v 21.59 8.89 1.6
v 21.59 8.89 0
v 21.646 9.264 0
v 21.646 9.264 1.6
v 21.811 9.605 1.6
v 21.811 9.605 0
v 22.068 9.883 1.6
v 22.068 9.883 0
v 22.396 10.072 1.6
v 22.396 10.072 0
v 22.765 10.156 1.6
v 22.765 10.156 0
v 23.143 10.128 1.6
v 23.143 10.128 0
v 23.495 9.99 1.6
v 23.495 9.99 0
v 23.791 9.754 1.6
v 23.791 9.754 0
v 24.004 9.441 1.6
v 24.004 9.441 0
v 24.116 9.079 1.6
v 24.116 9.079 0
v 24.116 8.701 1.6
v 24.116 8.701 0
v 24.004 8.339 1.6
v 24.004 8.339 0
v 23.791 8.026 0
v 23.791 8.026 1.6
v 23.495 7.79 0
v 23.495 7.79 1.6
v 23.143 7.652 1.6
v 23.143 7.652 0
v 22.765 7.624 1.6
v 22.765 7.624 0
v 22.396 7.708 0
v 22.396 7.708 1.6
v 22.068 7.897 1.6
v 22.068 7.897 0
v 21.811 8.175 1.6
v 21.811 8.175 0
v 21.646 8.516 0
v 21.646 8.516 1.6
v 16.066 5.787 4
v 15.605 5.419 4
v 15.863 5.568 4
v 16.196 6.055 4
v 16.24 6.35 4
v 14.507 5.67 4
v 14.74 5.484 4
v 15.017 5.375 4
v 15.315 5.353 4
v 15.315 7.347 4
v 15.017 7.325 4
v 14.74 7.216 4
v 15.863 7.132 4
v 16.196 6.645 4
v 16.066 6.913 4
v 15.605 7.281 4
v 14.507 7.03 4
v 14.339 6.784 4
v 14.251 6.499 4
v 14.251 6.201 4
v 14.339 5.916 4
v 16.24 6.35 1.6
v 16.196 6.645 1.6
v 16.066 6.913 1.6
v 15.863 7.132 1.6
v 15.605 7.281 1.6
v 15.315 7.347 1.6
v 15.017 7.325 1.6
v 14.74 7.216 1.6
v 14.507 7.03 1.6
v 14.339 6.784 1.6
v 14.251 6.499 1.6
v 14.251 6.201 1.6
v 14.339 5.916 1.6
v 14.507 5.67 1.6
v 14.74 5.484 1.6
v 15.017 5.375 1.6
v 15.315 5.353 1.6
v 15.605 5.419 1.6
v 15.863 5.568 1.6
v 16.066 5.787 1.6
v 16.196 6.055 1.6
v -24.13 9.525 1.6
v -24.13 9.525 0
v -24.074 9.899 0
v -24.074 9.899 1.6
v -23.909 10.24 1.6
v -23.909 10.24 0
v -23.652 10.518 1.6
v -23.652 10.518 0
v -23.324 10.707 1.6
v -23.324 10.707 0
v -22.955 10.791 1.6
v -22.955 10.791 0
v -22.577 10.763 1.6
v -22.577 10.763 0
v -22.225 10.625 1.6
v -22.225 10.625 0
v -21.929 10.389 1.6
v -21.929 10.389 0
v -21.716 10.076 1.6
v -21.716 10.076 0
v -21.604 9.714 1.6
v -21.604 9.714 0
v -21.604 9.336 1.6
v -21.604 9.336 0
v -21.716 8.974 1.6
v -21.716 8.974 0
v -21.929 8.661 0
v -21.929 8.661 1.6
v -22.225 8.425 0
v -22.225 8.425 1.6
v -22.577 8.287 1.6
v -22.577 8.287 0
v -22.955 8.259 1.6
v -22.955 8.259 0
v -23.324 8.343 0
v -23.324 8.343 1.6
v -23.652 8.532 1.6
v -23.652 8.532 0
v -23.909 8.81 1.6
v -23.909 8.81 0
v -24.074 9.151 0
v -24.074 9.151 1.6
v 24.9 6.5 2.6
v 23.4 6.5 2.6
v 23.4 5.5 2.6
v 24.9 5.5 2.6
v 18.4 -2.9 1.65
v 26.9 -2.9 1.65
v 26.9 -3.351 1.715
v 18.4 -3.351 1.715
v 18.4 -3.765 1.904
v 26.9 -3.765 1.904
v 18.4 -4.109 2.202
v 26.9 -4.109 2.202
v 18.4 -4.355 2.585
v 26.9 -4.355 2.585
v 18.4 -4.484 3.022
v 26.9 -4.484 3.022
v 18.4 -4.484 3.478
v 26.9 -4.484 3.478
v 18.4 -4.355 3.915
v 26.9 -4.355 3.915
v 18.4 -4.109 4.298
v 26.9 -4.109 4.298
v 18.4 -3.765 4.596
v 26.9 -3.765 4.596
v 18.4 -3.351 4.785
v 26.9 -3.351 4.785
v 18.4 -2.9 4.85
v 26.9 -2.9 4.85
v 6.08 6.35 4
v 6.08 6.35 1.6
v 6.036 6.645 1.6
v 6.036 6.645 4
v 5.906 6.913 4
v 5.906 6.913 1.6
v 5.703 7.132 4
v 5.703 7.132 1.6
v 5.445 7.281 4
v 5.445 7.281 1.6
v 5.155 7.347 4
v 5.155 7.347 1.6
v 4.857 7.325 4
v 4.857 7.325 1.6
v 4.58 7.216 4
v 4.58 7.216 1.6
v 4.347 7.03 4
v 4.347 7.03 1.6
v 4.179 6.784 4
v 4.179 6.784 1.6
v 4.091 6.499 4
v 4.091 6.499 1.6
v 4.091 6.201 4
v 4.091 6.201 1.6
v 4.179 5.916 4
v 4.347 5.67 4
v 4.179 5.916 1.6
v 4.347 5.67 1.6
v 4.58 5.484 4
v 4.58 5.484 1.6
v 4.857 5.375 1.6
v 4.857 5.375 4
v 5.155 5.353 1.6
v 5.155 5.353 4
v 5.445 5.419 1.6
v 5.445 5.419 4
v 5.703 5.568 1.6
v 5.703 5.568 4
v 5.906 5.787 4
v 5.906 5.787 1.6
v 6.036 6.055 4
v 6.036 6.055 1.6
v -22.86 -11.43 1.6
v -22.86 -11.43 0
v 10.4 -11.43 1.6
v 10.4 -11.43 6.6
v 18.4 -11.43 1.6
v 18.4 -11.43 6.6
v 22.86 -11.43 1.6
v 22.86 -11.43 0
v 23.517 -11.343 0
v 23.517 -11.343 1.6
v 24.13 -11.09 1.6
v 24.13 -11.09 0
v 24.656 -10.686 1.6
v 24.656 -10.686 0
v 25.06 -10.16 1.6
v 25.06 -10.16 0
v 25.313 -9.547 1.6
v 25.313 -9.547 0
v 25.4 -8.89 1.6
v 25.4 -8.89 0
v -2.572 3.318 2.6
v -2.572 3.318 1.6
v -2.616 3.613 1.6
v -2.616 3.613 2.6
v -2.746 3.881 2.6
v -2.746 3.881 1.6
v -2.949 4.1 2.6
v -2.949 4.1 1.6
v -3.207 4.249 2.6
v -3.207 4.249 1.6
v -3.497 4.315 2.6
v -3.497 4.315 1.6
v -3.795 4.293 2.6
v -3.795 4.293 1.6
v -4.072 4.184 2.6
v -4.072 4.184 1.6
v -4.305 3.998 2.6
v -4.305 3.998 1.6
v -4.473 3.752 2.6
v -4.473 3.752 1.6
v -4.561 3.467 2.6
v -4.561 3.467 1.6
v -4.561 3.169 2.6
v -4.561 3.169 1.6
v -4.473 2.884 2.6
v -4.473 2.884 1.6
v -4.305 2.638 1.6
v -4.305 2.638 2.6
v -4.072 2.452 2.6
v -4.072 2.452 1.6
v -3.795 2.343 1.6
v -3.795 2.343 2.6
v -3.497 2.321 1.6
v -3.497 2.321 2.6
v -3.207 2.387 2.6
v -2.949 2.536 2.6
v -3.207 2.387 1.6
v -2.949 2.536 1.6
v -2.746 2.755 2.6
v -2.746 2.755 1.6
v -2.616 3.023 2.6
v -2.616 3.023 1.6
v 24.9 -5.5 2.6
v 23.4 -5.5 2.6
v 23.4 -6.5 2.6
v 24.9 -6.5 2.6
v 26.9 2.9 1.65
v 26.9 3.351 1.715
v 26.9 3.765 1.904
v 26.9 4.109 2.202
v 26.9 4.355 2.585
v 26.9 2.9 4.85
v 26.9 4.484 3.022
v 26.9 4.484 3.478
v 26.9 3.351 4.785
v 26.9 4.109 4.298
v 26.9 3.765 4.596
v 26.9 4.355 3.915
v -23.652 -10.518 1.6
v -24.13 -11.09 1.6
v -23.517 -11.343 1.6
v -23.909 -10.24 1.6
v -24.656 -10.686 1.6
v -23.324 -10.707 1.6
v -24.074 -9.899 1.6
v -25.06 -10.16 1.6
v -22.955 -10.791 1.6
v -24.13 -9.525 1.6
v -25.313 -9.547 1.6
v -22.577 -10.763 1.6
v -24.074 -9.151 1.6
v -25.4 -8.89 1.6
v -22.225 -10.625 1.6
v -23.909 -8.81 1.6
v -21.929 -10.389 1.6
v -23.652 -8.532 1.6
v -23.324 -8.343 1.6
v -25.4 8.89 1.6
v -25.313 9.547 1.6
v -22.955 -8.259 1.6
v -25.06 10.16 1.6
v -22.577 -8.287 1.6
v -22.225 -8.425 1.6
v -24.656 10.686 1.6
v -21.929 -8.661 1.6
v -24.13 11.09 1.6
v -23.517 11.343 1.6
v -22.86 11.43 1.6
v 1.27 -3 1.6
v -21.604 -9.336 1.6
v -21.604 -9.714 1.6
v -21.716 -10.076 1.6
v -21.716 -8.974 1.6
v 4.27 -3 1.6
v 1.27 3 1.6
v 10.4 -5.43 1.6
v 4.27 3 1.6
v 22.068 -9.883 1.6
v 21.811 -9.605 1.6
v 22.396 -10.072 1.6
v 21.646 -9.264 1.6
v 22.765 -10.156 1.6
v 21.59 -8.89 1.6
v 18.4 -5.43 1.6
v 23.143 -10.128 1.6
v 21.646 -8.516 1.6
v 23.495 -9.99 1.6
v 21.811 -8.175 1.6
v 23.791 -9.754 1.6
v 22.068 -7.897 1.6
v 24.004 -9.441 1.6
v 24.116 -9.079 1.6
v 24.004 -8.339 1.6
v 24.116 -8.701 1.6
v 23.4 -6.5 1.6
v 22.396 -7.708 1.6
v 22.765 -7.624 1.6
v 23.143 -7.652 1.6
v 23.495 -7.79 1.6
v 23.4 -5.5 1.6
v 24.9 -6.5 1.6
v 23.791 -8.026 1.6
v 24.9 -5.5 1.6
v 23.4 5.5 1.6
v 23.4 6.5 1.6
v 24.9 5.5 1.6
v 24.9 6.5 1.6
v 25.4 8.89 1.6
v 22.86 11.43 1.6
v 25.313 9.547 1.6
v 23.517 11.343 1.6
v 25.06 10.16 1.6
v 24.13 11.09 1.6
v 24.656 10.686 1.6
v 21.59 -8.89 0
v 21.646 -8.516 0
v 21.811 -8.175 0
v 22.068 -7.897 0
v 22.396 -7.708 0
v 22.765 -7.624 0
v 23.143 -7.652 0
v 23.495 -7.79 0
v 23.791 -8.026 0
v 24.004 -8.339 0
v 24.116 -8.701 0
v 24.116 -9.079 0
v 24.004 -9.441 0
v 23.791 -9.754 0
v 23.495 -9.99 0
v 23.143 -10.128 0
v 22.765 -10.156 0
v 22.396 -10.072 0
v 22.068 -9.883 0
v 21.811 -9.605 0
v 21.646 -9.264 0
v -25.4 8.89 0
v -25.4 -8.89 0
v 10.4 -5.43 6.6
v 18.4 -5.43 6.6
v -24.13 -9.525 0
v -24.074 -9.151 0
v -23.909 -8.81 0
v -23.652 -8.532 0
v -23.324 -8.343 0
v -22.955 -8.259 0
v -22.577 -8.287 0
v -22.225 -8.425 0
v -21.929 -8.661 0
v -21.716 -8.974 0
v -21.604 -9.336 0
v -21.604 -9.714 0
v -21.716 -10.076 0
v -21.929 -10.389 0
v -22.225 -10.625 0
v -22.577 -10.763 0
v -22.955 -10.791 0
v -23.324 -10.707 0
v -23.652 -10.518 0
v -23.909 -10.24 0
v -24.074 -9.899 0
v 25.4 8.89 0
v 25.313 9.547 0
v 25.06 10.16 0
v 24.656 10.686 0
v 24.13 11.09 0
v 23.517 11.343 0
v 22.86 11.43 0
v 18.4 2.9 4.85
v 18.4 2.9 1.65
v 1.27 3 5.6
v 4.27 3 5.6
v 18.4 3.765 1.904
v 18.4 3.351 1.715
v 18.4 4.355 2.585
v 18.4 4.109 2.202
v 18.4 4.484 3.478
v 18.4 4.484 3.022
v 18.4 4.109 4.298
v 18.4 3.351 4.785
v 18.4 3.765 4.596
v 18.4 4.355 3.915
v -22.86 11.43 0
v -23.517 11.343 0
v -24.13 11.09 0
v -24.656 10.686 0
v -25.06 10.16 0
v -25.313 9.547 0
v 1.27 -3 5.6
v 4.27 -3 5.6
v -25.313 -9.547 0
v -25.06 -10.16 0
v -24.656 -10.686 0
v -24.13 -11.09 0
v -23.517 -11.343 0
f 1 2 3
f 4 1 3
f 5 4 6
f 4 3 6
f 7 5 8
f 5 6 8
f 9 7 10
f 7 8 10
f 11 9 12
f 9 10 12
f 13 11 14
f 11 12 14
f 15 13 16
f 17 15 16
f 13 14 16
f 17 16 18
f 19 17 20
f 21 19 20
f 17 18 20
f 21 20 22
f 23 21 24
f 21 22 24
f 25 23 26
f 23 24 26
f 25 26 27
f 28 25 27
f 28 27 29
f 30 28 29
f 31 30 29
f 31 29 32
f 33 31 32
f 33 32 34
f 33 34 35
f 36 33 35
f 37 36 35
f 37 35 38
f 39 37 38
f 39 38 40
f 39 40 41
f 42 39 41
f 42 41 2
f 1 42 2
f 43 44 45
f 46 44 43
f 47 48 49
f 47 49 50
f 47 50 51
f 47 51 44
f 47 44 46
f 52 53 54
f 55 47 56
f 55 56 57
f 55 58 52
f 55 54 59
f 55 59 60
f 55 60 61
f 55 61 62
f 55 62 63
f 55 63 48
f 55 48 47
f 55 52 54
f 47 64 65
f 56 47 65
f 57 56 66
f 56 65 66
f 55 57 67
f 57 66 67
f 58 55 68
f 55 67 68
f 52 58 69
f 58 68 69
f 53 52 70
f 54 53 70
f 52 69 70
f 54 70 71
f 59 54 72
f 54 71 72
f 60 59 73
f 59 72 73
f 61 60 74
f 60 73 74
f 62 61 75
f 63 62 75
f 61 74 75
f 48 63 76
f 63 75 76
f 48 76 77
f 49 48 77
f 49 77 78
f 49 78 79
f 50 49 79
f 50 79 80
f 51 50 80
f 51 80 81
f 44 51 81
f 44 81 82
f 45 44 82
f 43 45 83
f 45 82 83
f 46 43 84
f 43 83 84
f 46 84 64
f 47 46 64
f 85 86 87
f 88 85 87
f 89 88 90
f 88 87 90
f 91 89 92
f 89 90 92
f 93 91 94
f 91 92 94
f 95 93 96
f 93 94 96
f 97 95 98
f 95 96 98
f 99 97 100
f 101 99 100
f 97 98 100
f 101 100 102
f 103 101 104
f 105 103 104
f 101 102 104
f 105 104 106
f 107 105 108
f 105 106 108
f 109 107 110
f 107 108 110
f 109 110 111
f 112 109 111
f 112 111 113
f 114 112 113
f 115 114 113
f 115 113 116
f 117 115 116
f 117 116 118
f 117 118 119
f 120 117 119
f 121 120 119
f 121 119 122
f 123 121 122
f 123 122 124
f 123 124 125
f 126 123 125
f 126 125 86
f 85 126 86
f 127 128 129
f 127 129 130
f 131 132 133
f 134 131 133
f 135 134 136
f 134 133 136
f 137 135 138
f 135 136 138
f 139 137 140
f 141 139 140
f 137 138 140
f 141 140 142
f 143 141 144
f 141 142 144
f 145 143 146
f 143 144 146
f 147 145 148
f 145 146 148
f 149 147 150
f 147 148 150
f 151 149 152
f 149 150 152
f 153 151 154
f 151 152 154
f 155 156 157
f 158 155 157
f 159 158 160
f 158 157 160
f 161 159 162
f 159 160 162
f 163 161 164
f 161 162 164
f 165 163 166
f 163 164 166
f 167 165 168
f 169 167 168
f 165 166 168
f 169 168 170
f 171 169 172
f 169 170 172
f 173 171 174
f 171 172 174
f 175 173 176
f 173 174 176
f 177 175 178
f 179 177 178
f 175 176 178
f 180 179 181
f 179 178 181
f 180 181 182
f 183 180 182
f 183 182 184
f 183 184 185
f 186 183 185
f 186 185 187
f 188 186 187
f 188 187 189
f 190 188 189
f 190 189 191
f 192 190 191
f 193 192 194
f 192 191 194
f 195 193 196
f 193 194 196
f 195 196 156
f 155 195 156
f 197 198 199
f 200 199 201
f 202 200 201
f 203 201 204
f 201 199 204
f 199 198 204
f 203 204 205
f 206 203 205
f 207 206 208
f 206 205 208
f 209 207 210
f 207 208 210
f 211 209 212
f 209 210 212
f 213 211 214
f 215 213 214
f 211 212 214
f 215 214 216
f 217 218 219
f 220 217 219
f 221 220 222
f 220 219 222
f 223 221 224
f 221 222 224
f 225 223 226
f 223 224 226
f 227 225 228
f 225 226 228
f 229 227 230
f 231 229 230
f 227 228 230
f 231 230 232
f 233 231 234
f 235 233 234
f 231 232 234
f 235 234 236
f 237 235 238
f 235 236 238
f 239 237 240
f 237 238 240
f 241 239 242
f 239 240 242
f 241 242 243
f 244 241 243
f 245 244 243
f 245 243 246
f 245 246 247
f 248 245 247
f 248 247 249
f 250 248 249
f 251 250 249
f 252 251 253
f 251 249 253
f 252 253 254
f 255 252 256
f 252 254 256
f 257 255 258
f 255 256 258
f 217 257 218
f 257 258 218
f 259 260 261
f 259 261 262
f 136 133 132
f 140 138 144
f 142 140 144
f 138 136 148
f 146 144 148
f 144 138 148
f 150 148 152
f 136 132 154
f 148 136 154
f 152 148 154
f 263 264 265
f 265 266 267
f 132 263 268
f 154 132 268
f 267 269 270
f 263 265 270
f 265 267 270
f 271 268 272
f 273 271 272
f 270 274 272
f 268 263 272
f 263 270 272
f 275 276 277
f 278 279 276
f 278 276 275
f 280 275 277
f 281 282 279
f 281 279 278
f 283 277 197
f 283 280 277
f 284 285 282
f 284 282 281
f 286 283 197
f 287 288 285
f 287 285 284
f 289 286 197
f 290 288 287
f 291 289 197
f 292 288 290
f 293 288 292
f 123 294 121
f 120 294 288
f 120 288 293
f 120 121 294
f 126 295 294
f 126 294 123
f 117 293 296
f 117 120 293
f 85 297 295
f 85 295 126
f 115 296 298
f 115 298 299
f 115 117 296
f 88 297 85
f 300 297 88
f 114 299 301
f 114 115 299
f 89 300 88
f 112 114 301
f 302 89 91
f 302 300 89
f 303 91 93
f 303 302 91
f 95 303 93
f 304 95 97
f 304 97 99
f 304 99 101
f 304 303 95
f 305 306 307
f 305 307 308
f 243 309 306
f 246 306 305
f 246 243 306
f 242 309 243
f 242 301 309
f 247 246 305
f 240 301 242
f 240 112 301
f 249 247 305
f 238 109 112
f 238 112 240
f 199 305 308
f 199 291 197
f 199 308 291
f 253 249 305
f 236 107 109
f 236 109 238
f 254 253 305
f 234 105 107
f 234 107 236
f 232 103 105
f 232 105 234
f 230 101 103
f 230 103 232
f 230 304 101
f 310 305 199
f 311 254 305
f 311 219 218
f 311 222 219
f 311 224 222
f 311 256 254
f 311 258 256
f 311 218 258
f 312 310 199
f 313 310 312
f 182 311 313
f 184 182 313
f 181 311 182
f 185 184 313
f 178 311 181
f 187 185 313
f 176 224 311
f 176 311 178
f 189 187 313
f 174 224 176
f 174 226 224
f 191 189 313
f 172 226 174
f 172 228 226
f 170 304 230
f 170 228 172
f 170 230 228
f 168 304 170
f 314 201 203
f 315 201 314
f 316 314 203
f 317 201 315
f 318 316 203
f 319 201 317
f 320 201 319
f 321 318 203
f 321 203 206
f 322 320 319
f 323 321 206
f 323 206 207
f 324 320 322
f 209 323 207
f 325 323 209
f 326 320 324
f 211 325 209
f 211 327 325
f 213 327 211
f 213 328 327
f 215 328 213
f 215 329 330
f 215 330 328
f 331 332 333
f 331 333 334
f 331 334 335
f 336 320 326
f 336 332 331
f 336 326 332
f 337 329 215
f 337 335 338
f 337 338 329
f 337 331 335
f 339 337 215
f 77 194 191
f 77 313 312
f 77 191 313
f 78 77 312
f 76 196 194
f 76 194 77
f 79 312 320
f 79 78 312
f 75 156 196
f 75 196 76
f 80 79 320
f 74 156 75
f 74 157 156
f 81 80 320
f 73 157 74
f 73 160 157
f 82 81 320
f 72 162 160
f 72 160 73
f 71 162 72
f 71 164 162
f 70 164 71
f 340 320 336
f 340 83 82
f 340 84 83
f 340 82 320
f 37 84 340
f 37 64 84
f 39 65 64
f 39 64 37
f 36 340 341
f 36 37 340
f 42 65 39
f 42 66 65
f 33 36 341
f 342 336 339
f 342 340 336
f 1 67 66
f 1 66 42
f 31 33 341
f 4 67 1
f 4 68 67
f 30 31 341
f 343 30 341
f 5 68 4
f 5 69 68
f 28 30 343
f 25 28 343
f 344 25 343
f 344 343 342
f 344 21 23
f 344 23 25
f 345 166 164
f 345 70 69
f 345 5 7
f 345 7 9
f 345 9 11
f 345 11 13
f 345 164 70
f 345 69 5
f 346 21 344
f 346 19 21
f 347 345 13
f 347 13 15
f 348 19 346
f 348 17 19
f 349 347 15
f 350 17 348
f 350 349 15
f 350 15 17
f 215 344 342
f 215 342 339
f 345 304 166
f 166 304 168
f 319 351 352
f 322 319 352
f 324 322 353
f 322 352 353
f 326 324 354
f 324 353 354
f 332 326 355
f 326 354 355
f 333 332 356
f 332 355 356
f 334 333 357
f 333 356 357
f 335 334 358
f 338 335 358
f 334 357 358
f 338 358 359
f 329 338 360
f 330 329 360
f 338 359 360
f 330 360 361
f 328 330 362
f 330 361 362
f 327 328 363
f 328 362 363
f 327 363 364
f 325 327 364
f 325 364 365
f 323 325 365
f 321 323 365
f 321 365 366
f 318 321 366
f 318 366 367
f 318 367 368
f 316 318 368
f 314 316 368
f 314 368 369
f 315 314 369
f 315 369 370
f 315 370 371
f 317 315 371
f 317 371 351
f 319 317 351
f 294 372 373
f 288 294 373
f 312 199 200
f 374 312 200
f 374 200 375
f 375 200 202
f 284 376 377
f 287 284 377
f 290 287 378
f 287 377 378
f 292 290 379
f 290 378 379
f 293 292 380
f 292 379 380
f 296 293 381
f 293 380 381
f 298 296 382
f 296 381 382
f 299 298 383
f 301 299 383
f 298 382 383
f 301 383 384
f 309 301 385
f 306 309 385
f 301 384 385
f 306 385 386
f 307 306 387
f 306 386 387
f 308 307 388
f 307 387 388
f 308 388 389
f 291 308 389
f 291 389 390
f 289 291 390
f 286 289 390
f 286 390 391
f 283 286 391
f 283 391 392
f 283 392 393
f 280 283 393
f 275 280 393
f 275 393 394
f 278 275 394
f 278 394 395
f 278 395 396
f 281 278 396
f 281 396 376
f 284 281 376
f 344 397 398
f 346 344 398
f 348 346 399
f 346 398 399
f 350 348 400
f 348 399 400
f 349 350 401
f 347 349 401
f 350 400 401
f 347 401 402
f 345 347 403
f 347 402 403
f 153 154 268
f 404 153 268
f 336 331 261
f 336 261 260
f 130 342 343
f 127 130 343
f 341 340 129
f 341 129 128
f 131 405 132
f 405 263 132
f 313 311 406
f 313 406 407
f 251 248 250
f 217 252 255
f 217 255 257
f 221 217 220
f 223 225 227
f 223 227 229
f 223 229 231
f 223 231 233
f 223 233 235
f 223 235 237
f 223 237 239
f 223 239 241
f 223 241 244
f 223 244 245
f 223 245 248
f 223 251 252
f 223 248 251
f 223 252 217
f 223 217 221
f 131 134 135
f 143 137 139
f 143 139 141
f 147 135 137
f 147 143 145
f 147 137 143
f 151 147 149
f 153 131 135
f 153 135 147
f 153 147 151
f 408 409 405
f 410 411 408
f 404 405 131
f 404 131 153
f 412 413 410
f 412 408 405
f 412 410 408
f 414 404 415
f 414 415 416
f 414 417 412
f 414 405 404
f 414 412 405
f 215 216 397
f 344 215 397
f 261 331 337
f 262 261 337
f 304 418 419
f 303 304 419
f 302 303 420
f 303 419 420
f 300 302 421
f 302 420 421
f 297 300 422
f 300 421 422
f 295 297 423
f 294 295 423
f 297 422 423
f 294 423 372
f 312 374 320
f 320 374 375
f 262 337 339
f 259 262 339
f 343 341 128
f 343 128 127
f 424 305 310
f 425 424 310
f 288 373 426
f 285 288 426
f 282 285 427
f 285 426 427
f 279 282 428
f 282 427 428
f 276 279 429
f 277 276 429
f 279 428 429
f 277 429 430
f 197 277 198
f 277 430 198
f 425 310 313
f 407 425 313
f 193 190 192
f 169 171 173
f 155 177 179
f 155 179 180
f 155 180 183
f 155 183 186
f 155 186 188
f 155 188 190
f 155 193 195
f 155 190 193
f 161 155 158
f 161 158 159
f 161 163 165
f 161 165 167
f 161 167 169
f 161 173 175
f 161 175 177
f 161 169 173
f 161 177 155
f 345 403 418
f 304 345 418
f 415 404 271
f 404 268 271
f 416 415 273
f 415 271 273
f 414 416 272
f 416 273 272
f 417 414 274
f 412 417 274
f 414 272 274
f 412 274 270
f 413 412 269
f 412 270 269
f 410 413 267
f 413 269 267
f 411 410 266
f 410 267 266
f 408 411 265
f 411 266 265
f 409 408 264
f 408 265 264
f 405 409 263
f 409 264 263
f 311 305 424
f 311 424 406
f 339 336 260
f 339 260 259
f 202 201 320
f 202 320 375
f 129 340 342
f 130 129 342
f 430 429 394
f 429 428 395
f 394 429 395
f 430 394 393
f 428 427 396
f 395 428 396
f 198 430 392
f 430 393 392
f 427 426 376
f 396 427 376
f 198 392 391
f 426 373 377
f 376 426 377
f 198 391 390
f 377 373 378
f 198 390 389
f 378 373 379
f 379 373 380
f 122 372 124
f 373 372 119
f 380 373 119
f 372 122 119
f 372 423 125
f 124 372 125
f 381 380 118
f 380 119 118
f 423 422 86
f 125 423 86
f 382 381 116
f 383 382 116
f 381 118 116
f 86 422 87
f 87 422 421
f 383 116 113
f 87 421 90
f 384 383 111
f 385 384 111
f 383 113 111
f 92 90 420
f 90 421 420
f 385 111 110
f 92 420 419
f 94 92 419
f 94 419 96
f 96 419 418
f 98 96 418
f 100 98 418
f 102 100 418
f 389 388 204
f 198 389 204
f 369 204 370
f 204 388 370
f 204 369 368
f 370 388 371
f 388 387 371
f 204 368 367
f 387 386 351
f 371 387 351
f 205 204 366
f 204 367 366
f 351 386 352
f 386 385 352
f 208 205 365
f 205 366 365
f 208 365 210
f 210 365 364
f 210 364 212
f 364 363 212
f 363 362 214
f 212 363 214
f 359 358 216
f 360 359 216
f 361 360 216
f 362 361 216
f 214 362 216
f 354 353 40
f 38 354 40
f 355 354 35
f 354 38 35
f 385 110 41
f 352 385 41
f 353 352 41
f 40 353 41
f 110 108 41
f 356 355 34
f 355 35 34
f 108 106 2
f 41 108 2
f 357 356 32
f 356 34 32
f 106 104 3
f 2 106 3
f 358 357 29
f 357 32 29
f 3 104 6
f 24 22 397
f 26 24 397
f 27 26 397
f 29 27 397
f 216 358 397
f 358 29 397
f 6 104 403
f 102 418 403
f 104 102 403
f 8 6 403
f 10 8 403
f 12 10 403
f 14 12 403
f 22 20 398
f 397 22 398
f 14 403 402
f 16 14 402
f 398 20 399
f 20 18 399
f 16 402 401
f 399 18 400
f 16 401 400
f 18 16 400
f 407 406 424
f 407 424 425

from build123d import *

# Parameters (mm, degrees)
BOARD_DEPTH              = 1.6
DURCHGANGSLOCH_F_R_M21_D = 2.54
USBC_DEPTH               = 1.5
USBC_DEPTH_BACK          = 7
SKIZZE5_W                = 8
SKIZZE5_H                = 5
BATTERY_DEPTH            = 6
SKIZZE6_R                = 1
BUTTONS_DEPTH            = 2.4
SKIZZE7_W                = 3
SKIZZE7_H                = 6
QWIIC_DEPTH              = 4
SKIZZE8_R                = 1
NEOPIXEL_DEPTH           = 1
SKIZZE9_W                = 1.5
SKIZZE9_H                = 1
LEDS_DEPTH               = 1


with BuildPart() as part:
    # Skizze1 → board (new body)
    with BuildSketch(Plane.XY):
        with BuildLine():
            Line((-22.86, -11.43), (22.86, -11.43))
            ThreePointArc((22.86, -11.43), (24.656051224, -10.686051224), (25.4, -8.89))
            Line((25.4, -8.89), (25.4, 8.89))
            ThreePointArc((25.4, 8.89), (24.656051224, 10.686051224), (22.86, 11.43))
            Line((22.86, 11.43), (-22.86, 11.43))
            ThreePointArc((-22.86, 11.43), (-24.656051224, 10.686051224), (-25.4, 8.89))
            Line((-25.4, 8.89), (-25.4, -8.89))
            ThreePointArc((-25.4, -8.89), (-24.656051224, -10.686051224), (-22.86, -11.43))
        make_face()
    extrude(amount=BOARD_DEPTH)

    # Durchgangsloch für M21 (through all)
    with Locations(Plane.XY.offset(1.6)):
        with Locations((-22.86, 9.525), (-22.86, -9.525), (22.86, 8.89), (22.86, -8.89)):
            Hole(DURCHGANGSLOCH_F_R_M21_D / 2)

    # Skizze5 → battery (add)
    with BuildSketch(Plane.XZ.offset(11.43)):
        with Locations((14.4, 4.1)):
            Rectangle(SKIZZE5_W, SKIZZE5_H)
    extrude(amount=-BATTERY_DEPTH)

    # Skizze6 → buttons (add)
    with BuildSketch(Plane.XY.offset(1.6)):
        with Locations((15.24, 6.35)):
            Circle(SKIZZE6_R)
        with Locations((5.08, 6.35)):
            Circle(SKIZZE6_R)
    extrude(amount=BUTTONS_DEPTH)

    # Skizze7 → qwiic (add)
    with BuildSketch(Plane.XY.offset(1.6)):
        with Locations((2.77, 0)):
            Rectangle(SKIZZE7_W, SKIZZE7_H)
    extrude(amount=QWIIC_DEPTH)

    # Skizze8 → neopixel (add)
    with BuildSketch(Plane.XY.offset(1.6)):
        with Locations((-3.572, 3.318)):
            Circle(SKIZZE8_R)
    extrude(amount=NEOPIXEL_DEPTH)

    # Skizze9 → leds (add)
    with BuildSketch(Plane.XY.offset(1.6)):
        with Locations((24.15, 6)):
            Rectangle(SKIZZE9_W, SKIZZE9_H)
        with Locations((24.15, -6)):
            Rectangle(SKIZZE9_W, SKIZZE9_H)
    extrude(amount=LEDS_DEPTH)


with BuildPart() as body_2:
    # Skizze4 → usbc (new body, two sides)
    with BuildSketch(Plane(origin=(25.4, 0, 0), x_dir=(0, 0, -1), z_dir=(1, 0, 0))) as usbc_sk:
        with BuildLine():
            Line((-4.85, -2.9), (-4.85, 2.9))
            ThreePointArc((-4.85, 2.9), (-3.25, 4.5), (-1.65, 2.9))
            Line((-1.65, 2.9), (-1.65, -2.9))
            ThreePointArc((-1.65, -2.9), (-3.25, -4.5), (-4.85, -2.9))
        make_face()
    extrude(amount=USBC_DEPTH)
    extrude(usbc_sk.sketch, amount=-USBC_DEPTH_BACK)


solid = Compound([part.part, body_2.part])
